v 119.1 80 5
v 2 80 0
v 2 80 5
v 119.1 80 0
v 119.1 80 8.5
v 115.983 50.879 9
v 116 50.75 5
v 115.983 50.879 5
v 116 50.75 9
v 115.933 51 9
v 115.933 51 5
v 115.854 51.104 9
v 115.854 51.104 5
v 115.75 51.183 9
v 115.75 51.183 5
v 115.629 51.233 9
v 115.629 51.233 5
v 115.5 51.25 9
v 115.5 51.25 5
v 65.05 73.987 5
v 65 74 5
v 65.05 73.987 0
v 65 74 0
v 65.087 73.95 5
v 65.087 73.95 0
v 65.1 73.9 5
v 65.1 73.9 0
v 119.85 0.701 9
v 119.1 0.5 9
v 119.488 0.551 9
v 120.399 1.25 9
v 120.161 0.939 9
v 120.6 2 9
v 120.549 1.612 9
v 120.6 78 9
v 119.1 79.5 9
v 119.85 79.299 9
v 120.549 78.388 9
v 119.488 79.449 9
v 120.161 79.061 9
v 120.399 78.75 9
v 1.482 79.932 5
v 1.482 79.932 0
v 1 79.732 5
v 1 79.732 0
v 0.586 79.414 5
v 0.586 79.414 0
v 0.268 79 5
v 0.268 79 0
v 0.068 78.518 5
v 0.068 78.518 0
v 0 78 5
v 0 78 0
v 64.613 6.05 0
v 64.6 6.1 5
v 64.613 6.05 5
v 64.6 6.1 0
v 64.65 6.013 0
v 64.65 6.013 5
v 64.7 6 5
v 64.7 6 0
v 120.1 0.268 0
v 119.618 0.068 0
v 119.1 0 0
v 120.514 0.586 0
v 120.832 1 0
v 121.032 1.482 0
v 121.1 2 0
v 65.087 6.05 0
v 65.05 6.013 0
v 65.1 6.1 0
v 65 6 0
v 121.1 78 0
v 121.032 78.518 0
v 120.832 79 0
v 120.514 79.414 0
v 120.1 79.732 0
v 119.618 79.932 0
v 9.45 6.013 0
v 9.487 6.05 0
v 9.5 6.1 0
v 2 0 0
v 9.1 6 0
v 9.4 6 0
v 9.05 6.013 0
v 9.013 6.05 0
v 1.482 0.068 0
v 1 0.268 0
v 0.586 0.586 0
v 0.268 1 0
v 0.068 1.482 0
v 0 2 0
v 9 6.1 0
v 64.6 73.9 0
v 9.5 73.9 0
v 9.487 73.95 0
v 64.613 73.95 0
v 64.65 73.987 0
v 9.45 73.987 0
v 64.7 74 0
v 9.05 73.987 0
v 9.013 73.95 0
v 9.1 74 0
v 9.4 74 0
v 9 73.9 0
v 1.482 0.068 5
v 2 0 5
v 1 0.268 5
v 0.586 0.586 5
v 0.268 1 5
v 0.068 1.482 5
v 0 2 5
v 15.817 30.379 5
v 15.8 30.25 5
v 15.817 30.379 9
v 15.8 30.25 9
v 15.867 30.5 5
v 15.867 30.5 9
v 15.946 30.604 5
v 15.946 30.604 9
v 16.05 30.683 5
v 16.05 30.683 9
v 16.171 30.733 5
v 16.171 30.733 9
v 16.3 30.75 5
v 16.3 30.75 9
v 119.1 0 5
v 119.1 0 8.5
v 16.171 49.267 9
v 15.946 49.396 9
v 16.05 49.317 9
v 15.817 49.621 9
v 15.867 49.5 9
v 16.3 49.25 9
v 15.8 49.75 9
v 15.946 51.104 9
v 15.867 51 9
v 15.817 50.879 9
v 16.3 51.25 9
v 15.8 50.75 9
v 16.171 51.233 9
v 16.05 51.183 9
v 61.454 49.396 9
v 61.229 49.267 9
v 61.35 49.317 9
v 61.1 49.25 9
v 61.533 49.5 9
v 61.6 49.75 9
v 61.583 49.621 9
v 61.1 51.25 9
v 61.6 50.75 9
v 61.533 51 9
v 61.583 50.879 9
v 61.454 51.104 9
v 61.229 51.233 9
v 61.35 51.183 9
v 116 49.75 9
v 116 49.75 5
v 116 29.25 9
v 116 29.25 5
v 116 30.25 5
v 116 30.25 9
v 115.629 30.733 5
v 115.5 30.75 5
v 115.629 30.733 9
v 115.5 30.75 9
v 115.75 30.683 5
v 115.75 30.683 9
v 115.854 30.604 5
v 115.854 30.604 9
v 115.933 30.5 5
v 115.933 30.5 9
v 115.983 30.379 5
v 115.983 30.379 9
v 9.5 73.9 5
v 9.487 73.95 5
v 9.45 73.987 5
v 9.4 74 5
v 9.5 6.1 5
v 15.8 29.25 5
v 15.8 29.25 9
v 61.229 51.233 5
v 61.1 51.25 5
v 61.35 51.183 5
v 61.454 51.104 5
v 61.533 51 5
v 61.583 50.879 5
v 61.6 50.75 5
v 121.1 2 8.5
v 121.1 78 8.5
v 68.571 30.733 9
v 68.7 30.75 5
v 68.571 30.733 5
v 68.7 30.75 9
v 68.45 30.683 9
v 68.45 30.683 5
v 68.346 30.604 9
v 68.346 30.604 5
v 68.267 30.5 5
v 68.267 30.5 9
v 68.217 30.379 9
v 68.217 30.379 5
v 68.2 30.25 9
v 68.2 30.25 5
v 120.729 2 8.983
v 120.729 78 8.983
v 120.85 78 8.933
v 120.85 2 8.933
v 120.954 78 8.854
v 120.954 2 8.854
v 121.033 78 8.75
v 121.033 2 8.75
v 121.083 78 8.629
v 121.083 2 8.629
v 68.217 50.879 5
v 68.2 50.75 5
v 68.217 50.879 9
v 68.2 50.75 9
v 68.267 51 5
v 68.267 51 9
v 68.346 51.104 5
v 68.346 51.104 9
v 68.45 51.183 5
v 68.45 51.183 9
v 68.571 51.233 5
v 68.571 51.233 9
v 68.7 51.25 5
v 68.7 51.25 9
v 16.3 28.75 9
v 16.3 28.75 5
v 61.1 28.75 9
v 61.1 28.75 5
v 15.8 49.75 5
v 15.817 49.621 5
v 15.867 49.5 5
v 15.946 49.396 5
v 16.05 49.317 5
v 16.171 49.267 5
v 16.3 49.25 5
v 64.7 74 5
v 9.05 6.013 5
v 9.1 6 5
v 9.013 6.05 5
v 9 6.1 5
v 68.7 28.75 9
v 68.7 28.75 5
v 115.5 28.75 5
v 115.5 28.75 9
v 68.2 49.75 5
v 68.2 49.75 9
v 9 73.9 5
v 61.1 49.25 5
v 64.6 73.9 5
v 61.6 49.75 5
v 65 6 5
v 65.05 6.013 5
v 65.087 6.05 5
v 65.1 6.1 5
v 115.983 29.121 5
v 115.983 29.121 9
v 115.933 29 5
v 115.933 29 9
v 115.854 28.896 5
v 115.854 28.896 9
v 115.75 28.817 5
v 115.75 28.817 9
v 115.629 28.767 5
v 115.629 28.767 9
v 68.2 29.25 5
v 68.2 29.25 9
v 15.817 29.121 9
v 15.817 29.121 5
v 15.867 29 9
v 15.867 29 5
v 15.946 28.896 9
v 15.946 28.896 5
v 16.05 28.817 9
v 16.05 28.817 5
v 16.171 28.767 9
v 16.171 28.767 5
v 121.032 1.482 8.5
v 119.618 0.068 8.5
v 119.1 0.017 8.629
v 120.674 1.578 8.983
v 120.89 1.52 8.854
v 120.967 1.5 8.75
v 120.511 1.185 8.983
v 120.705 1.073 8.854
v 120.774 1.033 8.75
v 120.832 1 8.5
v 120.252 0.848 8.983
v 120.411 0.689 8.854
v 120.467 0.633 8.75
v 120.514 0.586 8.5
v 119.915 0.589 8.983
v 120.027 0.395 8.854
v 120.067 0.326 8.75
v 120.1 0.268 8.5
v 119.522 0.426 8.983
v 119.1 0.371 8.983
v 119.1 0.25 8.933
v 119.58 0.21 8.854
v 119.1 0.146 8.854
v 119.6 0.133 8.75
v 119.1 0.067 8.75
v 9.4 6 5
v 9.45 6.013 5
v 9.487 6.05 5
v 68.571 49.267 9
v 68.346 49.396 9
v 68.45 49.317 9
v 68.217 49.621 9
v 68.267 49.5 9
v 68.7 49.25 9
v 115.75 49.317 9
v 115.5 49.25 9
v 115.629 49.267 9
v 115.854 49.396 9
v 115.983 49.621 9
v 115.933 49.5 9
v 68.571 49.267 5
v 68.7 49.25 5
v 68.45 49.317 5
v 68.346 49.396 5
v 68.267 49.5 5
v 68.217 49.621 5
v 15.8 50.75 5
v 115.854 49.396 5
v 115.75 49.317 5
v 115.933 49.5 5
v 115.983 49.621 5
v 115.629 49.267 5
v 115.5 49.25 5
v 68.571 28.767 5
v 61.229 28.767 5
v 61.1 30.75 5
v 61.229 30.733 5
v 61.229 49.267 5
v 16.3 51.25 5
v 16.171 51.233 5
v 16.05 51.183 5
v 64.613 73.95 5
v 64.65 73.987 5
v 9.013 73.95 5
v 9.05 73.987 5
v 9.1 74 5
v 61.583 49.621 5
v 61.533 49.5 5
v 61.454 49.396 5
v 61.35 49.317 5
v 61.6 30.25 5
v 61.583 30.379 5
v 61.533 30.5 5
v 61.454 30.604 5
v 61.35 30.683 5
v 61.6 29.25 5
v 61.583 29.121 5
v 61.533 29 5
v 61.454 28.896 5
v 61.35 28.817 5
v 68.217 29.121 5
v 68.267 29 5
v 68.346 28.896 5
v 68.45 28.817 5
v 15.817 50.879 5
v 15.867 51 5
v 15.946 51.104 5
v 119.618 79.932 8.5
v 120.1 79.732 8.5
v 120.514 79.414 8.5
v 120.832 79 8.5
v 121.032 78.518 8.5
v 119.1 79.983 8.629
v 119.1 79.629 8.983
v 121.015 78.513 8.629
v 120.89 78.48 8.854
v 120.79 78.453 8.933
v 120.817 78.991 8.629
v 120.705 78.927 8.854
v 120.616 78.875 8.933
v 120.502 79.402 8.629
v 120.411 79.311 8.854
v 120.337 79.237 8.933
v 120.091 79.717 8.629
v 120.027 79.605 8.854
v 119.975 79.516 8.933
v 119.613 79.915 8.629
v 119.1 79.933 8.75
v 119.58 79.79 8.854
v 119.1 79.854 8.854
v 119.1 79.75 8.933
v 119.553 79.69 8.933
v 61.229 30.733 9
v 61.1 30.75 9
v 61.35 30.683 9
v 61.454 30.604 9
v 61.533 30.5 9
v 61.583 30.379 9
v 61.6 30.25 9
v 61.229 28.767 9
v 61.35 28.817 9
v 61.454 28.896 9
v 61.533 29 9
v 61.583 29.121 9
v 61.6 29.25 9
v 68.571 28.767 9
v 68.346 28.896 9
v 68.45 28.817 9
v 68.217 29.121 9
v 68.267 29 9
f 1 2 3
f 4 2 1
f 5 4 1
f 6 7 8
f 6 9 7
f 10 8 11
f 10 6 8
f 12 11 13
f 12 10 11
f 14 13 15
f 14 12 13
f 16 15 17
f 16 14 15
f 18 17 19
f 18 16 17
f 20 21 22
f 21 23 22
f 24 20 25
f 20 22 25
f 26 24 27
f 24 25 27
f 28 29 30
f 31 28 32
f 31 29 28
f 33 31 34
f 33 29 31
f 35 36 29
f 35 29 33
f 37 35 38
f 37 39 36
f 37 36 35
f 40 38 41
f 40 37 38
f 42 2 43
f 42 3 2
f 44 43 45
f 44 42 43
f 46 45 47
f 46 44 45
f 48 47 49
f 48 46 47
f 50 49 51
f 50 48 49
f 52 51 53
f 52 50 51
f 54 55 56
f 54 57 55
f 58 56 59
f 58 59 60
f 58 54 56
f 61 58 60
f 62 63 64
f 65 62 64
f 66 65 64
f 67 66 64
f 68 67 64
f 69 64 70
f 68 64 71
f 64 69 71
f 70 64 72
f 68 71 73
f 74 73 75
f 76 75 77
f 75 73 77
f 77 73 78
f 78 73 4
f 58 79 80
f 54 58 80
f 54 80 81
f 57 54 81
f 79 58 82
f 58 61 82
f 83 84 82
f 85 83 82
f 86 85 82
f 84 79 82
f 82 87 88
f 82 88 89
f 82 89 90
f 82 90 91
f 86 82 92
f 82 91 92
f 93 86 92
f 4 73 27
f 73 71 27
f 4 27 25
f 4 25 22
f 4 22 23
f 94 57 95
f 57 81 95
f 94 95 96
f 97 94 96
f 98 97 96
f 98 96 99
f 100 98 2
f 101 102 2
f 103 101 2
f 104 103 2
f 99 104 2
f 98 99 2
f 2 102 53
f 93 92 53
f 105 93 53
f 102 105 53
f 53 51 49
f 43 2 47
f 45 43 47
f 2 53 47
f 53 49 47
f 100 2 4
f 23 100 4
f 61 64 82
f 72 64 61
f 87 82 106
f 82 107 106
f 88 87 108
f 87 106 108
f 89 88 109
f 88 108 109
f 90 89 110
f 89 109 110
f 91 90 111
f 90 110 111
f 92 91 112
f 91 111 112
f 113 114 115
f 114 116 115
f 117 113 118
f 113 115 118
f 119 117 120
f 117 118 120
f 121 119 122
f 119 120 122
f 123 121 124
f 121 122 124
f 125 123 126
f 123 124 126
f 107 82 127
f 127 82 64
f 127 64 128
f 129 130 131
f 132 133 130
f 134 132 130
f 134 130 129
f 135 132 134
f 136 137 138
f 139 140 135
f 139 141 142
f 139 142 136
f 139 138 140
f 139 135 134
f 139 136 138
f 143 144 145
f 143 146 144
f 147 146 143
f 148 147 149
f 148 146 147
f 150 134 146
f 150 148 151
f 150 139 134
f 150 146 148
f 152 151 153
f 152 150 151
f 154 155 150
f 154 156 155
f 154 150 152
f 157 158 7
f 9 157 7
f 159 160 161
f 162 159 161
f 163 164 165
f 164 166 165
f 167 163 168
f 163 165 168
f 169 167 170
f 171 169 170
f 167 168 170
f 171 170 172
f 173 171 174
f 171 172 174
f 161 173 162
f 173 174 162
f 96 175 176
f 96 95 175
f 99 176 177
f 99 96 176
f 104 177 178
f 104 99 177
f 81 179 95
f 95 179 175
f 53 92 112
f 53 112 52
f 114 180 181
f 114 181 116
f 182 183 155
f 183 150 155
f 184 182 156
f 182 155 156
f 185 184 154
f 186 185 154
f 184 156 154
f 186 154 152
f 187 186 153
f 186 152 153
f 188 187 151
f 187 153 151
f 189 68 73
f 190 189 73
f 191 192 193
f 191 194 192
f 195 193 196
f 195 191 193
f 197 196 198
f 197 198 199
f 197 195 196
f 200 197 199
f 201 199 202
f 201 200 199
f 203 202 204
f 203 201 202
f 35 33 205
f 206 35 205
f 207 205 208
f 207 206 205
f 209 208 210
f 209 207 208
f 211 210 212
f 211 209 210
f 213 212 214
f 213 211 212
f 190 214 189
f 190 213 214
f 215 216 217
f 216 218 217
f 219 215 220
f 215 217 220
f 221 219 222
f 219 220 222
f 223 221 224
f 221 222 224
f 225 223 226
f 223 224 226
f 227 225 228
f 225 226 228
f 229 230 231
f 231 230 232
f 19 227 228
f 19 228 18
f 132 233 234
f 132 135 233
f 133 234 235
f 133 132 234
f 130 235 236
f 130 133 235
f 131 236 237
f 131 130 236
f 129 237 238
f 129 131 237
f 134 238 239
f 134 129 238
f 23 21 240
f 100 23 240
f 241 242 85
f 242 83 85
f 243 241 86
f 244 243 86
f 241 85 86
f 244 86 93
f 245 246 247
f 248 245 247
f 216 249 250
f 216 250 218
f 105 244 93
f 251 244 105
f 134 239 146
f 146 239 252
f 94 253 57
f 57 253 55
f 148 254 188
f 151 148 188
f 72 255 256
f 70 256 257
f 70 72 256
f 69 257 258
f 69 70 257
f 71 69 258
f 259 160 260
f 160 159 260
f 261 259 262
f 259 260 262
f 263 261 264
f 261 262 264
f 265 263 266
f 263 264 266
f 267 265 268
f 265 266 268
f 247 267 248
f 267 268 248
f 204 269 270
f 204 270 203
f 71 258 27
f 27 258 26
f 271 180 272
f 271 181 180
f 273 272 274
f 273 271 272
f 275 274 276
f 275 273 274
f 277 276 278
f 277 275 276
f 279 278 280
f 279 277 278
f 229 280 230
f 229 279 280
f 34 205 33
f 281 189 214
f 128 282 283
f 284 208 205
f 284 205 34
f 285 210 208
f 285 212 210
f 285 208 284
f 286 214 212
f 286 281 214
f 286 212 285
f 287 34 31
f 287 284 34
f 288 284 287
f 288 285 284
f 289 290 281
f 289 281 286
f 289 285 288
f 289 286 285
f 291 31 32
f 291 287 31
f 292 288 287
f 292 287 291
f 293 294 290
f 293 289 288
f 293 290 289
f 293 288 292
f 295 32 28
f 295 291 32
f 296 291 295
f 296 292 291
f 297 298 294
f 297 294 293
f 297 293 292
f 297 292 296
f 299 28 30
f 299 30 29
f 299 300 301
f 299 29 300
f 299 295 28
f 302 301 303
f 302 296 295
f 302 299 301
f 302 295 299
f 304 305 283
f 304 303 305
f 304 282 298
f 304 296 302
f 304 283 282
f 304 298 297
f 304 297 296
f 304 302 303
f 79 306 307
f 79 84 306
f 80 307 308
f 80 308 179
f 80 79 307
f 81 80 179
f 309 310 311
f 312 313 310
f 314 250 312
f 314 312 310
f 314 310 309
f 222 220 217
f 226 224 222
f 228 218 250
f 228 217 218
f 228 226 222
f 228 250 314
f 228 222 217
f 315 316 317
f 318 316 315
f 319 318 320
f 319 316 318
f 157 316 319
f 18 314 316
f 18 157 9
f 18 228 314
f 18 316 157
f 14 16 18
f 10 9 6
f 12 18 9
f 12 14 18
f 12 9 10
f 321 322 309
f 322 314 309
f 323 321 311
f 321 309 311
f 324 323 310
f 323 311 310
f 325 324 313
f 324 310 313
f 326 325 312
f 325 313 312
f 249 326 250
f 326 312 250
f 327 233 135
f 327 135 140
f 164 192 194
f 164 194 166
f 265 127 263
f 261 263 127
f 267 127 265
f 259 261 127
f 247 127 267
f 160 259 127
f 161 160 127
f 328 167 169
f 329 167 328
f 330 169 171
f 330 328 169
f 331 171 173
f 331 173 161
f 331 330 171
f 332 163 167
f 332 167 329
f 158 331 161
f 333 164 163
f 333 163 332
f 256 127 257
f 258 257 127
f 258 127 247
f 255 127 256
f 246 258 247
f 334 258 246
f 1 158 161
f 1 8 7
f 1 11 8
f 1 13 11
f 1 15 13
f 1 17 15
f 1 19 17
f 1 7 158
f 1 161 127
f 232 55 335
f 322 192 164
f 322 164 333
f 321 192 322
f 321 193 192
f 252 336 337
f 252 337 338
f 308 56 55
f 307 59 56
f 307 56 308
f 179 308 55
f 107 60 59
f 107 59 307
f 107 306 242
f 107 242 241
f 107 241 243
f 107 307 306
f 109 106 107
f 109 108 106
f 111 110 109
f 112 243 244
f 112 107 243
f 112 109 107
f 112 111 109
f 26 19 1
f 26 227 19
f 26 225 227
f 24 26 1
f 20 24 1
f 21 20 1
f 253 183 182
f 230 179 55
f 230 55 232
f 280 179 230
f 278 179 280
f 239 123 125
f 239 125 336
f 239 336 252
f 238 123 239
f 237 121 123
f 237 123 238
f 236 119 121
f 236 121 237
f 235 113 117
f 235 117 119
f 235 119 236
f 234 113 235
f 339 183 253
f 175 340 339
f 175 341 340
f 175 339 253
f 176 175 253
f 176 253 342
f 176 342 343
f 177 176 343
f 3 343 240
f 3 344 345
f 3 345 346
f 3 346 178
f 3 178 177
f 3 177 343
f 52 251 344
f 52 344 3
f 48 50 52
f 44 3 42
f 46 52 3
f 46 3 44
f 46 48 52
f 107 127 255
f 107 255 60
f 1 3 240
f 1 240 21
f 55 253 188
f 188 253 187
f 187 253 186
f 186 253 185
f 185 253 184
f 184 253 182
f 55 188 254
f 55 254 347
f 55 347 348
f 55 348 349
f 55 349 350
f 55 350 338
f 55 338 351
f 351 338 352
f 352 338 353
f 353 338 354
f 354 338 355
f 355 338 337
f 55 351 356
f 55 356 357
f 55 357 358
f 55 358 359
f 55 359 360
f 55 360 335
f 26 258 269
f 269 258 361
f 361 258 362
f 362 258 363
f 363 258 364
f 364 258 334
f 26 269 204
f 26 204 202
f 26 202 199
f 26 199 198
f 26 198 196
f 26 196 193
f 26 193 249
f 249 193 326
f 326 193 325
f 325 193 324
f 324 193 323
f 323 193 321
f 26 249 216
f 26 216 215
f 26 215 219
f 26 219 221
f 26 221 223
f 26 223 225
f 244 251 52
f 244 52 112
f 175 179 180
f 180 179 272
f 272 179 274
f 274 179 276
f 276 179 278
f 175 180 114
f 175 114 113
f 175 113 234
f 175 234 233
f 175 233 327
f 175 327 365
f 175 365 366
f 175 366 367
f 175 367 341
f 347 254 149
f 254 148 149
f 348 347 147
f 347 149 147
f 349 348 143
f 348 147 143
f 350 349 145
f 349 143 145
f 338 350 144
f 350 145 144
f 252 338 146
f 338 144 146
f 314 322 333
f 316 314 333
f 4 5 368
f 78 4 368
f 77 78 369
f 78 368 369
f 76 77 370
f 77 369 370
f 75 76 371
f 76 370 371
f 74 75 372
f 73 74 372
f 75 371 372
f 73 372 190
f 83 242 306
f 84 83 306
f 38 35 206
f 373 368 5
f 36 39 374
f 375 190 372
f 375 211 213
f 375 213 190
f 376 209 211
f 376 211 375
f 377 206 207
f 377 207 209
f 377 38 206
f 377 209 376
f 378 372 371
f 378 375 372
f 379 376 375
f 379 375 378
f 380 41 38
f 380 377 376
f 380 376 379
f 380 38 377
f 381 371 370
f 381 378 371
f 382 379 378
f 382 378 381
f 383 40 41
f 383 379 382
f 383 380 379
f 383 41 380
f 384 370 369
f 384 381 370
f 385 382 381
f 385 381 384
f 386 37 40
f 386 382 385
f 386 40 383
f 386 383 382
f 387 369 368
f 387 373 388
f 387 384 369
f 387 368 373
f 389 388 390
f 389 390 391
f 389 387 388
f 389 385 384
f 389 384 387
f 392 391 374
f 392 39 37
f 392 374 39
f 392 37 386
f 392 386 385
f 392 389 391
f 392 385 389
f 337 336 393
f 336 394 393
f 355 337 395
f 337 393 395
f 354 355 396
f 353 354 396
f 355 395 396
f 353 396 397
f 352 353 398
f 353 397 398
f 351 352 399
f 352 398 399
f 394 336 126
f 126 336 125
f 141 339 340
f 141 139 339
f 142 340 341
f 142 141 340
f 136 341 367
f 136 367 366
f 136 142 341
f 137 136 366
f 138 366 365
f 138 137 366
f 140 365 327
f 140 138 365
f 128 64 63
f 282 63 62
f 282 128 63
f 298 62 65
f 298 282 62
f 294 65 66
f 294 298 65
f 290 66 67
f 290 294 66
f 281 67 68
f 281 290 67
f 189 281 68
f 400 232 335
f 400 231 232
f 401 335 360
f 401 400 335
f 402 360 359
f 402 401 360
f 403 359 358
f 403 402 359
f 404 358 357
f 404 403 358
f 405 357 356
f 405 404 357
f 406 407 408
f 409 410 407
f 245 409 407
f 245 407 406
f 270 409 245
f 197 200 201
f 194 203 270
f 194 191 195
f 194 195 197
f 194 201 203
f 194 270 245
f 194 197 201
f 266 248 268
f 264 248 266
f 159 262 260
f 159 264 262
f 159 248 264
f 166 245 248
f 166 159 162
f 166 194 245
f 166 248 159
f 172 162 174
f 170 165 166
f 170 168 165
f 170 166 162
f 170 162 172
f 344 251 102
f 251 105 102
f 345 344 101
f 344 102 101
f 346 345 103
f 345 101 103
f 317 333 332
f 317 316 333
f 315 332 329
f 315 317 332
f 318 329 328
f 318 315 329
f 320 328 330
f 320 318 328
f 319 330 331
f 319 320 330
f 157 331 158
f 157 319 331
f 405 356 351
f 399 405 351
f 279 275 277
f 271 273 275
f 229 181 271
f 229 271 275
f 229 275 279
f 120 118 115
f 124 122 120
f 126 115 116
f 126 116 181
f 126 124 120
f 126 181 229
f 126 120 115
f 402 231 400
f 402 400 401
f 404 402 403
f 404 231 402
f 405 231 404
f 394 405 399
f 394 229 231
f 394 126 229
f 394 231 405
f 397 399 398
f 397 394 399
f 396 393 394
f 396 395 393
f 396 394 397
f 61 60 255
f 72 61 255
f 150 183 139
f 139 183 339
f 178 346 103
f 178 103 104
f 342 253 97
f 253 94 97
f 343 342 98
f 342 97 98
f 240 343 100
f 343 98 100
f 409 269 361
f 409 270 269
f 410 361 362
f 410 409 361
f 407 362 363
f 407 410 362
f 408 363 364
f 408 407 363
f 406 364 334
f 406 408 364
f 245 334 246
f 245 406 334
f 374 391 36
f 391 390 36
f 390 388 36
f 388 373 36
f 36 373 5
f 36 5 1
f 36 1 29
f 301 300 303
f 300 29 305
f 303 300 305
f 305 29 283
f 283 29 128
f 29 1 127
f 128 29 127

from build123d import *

# Parameters (mm, degrees)
F0_W         = 119.1
F0_H         = 80
F1_DEPTH     = 5
F3_DEPTH     = 63.1
F4_W         = 6.8
F4_H         = 2
F4_W_2       = 7
F4_W_3       = 6.5
F5_DEPTH     = 4
F6_W         = 47.8
F6_H         = 2
F7_DEPTH     = 4
F8_W         = 0.5
F8_H         = 68
F9_DEPTH     = 25
F10_W        = 80
F10_H        = 5
F11_DEPTH    = 2
F12_W        = 2
F12_H        = 32.5577612221
F12_H_2      = 47.4422387779
F13_DEPTH    = 4
F14_R        = 1.99999
F15_R        = 0.5
F16_R        = 0.1
F17_T1_DEPTH = 76.00002
F17_T3_DEPTH = 1.25001
F17_T6_ANGLE = 90
F17_T8_ANGLE = 90


# Not quite as in the source:
# - a fillet or chamfer that OpenCascade refuses, or shapes differently, is made with other operations: its cross-section is extruded or revolved along the edge and cut away or added
# - a fillet or chamfer is up to 0.001 mm smaller than in the source, because OpenCascade refuses the exact size


with BuildPart() as f1:
    # F0 (on Top) → F1 (new body)
    with BuildSketch(Plane.XY):
        with Locations((59.55, 40)):
            Rectangle(F0_W, F0_H)
    extrude(amount=F1_DEPTH)

    # F2 (on face) → F3 (cut)
    with BuildSketch(Plane.XY.offset(5)):
        Polygon((64.6, 74), (64.6, 25), (64.6, 6), (65.1, 6), (65.1, 74), align=None)
    extrude(amount=-F3_DEPTH, mode=Mode.SUBTRACT)

    # F4 (on face) → F5 (join)
    with BuildSketch(Plane.XY.offset(5)):
        with Locations((32.5, 50.25)):
            Rectangle(F4_W, F4_H)
        Polygon((35.9, 49.25), (39.1217214942, 49.25), (41.1, 49.25), (41.1, 51.25), (35.9, 51.25), align=None)
        with Locations((44.6, 50.25)):
            Rectangle(F4_W_2, F4_H)
        with Locations((51.35, 50.25)):
            Rectangle(F4_W_3, F4_H)
        with Locations((19.2, 50.25)):
            Rectangle(F4_W, F4_H)
        with Locations((25.85, 50.25)):
            Rectangle(F4_W_3, F4_H)
        with Locations((58.1, 50.25)):
            Rectangle(F4_W_2, F4_H)
        with Locations((44.6, 29.75)):
            Rectangle(F4_W_2, F4_H)
        with Locations((32.5, 29.75)):
            Rectangle(F4_W, F4_H)
        with Locations((58.1, 29.75)):
            Rectangle(F4_W_2, F4_H)
        Polygon((41.1, 30.75), (39.1217214942, 30.75), (35.9, 30.75), (35.9, 28.75), (39.8, 28.75), (41.1, 28.75), align=None)
        with Locations((51.35, 29.75)):
            Rectangle(F4_W_3, F4_H)
        with Locations((25.85, 29.75)):
            Rectangle(F4_W_3, F4_H)
        with Locations((19.2, 29.75)):
            Rectangle(F4_W, F4_H)
    extrude(amount=F5_DEPTH)

    # F6 (on face) → F7 (join)
    with BuildSketch(Plane.XY.offset(5)):
        with Locations((92.1, 50.25)):
            Rectangle(F6_W, F6_H)
        with Locations((92.1, 29.75)):
            Rectangle(F6_W, F6_H)
    extrude(amount=F7_DEPTH)

    # F8 (on face) → F9 (cut)
    with BuildSketch(Plane.XY.offset(5)):
        with Locations((9.25, 40)):
            Rectangle(F8_W, F8_H)
    extrude(amount=-F9_DEPTH, mode=Mode.SUBTRACT)

    # F10 (on face) → F11 (join)
    with BuildSketch(Plane.YZ.offset(119.1)):
        with Locations((40, 2.5)):
            Rectangle(F10_W, F10_H)
    extrude(amount=F11_DEPTH)

    # F12 (on face) → F13 (join)
    with BuildSketch(Plane.XY.offset(5)):
        with Locations((120.1, 63.7211193889)):
            Rectangle(F12_W, F12_H)
        with Locations((120.1, 23.7211193889)):
            Rectangle(F12_W, F12_H_2)
    extrude(amount=F13_DEPTH)

    # F14 (radius 2 in the source; OpenCascade refuses exactly that, so slightly less here)
    f14_edges = [f1.edges().sort_by_distance(p)[0] for p in [
        (0, 80, 2.5),
        (0, 0, 2.5),
        (121.1, 80, 4.5),
        (121.1, 0, 4.5),
    ]]
    fillet(f14_edges, radius=F14_R)

    # F15
    f15_edges = [f1.edges().sort_by_distance(p)[0] for p in [
        (15.8, 49.25, 7),
        (15.8, 51.25, 7),
        (61.6, 49.25, 7),
        (61.6, 51.25, 7),
        (68.2, 49.25, 7),
        (68.2, 51.25, 7),
        (116, 49.25, 7),
        (116, 51.25, 7),
        (116, 28.75, 7),
        (116, 30.75, 7),
        (68.2, 28.75, 7),
        (68.2, 30.75, 7),
        (61.6, 28.75, 7),
        (61.6, 30.75, 7),
        (15.8, 28.75, 7),
        (15.8, 30.75, 7),
    ]]
    fillet(f15_edges, radius=F15_R)

    # F16
    f16_edges = [f1.edges().sort_by_distance(p)[0] for p in [
        (9.5, 6, 2.5),
        (9, 6, 2.5),
        (9.5, 74, 2.5),
        (9, 74, 2.5),
        (64.6, 74, 2.5),
        (65.1, 74, 2.5),
        (64.6, 6, 2.5),
        (65.1, 6, 2.5),
    ]]
    fillet(f16_edges, radius=F16_R)

    # F17: fillet of radius 0.5 on 1 edges, made by hand

    # F17_s2 → F17_t1 (cut)
    with BuildSketch(Plane.XZ.offset(-78.00001)):
        with BuildLine():
            ThreePointArc((120.6, 9), (120.9535533906, 8.8535533906), (121.1, 8.5))
            Line((121.1, 8.5), (121.1, 9))
            Line((121.1, 9), (120.6, 9))
        make_face()
    extrude(amount=F17_T1_DEPTH, mode=Mode.SUBTRACT)

    # F17_s4 → F17_t3 (cut)
    with BuildSketch(Plane.YZ.offset(117.85)):
        with BuildLine():
            ThreePointArc((80, 8.5), (79.8535533906, 8.8535533906), (79.5, 9))
            Line((79.5, 9), (80, 9))
            Line((80, 9), (80, 8.5))
        make_face()
        with BuildLine():
            ThreePointArc((0, 8.5), (0.1464466094, 8.8535533906), (0.5, 9))
            Line((0.5, 9), (0, 9))
            Line((0, 9), (0, 8.5))
        make_face()
    extrude(amount=F17_T3_DEPTH, mode=Mode.SUBTRACT)

    # F17_s5 → F17_t6 (revolve, cut)
    with BuildSketch(Plane.XZ.offset(-1.99999)):
        with BuildLine():
            ThreePointArc((120.6, 9), (120.9535533906, 8.8535533906), (121.1, 8.5))
            Line((121.1, 8.5), (121.1, 9))
            Line((121.1, 9), (120.6, 9))
        make_face()
    revolve(axis=Axis((119.10001, 1.99999, 9), (0, 0, -1)), revolution_arc=F17_T6_ANGLE, mode=Mode.SUBTRACT)

    # F17_s7 → F17_t8 (revolve, cut)
    with BuildSketch(Plane.XZ.offset(-78.00001)):
        with BuildLine():
            ThreePointArc((121.1, 8.5), (120.9535533906, 8.8535533906), (120.6, 9))
            Line((120.6, 9), (121.1, 9))
            Line((121.1, 9), (121.1, 8.5))
        make_face()
    revolve(axis=Axis((119.10001, 78.00001, 9), (0, 0, 1)), revolution_arc=F17_T8_ANGLE, mode=Mode.SUBTRACT)


solid = f1.part
